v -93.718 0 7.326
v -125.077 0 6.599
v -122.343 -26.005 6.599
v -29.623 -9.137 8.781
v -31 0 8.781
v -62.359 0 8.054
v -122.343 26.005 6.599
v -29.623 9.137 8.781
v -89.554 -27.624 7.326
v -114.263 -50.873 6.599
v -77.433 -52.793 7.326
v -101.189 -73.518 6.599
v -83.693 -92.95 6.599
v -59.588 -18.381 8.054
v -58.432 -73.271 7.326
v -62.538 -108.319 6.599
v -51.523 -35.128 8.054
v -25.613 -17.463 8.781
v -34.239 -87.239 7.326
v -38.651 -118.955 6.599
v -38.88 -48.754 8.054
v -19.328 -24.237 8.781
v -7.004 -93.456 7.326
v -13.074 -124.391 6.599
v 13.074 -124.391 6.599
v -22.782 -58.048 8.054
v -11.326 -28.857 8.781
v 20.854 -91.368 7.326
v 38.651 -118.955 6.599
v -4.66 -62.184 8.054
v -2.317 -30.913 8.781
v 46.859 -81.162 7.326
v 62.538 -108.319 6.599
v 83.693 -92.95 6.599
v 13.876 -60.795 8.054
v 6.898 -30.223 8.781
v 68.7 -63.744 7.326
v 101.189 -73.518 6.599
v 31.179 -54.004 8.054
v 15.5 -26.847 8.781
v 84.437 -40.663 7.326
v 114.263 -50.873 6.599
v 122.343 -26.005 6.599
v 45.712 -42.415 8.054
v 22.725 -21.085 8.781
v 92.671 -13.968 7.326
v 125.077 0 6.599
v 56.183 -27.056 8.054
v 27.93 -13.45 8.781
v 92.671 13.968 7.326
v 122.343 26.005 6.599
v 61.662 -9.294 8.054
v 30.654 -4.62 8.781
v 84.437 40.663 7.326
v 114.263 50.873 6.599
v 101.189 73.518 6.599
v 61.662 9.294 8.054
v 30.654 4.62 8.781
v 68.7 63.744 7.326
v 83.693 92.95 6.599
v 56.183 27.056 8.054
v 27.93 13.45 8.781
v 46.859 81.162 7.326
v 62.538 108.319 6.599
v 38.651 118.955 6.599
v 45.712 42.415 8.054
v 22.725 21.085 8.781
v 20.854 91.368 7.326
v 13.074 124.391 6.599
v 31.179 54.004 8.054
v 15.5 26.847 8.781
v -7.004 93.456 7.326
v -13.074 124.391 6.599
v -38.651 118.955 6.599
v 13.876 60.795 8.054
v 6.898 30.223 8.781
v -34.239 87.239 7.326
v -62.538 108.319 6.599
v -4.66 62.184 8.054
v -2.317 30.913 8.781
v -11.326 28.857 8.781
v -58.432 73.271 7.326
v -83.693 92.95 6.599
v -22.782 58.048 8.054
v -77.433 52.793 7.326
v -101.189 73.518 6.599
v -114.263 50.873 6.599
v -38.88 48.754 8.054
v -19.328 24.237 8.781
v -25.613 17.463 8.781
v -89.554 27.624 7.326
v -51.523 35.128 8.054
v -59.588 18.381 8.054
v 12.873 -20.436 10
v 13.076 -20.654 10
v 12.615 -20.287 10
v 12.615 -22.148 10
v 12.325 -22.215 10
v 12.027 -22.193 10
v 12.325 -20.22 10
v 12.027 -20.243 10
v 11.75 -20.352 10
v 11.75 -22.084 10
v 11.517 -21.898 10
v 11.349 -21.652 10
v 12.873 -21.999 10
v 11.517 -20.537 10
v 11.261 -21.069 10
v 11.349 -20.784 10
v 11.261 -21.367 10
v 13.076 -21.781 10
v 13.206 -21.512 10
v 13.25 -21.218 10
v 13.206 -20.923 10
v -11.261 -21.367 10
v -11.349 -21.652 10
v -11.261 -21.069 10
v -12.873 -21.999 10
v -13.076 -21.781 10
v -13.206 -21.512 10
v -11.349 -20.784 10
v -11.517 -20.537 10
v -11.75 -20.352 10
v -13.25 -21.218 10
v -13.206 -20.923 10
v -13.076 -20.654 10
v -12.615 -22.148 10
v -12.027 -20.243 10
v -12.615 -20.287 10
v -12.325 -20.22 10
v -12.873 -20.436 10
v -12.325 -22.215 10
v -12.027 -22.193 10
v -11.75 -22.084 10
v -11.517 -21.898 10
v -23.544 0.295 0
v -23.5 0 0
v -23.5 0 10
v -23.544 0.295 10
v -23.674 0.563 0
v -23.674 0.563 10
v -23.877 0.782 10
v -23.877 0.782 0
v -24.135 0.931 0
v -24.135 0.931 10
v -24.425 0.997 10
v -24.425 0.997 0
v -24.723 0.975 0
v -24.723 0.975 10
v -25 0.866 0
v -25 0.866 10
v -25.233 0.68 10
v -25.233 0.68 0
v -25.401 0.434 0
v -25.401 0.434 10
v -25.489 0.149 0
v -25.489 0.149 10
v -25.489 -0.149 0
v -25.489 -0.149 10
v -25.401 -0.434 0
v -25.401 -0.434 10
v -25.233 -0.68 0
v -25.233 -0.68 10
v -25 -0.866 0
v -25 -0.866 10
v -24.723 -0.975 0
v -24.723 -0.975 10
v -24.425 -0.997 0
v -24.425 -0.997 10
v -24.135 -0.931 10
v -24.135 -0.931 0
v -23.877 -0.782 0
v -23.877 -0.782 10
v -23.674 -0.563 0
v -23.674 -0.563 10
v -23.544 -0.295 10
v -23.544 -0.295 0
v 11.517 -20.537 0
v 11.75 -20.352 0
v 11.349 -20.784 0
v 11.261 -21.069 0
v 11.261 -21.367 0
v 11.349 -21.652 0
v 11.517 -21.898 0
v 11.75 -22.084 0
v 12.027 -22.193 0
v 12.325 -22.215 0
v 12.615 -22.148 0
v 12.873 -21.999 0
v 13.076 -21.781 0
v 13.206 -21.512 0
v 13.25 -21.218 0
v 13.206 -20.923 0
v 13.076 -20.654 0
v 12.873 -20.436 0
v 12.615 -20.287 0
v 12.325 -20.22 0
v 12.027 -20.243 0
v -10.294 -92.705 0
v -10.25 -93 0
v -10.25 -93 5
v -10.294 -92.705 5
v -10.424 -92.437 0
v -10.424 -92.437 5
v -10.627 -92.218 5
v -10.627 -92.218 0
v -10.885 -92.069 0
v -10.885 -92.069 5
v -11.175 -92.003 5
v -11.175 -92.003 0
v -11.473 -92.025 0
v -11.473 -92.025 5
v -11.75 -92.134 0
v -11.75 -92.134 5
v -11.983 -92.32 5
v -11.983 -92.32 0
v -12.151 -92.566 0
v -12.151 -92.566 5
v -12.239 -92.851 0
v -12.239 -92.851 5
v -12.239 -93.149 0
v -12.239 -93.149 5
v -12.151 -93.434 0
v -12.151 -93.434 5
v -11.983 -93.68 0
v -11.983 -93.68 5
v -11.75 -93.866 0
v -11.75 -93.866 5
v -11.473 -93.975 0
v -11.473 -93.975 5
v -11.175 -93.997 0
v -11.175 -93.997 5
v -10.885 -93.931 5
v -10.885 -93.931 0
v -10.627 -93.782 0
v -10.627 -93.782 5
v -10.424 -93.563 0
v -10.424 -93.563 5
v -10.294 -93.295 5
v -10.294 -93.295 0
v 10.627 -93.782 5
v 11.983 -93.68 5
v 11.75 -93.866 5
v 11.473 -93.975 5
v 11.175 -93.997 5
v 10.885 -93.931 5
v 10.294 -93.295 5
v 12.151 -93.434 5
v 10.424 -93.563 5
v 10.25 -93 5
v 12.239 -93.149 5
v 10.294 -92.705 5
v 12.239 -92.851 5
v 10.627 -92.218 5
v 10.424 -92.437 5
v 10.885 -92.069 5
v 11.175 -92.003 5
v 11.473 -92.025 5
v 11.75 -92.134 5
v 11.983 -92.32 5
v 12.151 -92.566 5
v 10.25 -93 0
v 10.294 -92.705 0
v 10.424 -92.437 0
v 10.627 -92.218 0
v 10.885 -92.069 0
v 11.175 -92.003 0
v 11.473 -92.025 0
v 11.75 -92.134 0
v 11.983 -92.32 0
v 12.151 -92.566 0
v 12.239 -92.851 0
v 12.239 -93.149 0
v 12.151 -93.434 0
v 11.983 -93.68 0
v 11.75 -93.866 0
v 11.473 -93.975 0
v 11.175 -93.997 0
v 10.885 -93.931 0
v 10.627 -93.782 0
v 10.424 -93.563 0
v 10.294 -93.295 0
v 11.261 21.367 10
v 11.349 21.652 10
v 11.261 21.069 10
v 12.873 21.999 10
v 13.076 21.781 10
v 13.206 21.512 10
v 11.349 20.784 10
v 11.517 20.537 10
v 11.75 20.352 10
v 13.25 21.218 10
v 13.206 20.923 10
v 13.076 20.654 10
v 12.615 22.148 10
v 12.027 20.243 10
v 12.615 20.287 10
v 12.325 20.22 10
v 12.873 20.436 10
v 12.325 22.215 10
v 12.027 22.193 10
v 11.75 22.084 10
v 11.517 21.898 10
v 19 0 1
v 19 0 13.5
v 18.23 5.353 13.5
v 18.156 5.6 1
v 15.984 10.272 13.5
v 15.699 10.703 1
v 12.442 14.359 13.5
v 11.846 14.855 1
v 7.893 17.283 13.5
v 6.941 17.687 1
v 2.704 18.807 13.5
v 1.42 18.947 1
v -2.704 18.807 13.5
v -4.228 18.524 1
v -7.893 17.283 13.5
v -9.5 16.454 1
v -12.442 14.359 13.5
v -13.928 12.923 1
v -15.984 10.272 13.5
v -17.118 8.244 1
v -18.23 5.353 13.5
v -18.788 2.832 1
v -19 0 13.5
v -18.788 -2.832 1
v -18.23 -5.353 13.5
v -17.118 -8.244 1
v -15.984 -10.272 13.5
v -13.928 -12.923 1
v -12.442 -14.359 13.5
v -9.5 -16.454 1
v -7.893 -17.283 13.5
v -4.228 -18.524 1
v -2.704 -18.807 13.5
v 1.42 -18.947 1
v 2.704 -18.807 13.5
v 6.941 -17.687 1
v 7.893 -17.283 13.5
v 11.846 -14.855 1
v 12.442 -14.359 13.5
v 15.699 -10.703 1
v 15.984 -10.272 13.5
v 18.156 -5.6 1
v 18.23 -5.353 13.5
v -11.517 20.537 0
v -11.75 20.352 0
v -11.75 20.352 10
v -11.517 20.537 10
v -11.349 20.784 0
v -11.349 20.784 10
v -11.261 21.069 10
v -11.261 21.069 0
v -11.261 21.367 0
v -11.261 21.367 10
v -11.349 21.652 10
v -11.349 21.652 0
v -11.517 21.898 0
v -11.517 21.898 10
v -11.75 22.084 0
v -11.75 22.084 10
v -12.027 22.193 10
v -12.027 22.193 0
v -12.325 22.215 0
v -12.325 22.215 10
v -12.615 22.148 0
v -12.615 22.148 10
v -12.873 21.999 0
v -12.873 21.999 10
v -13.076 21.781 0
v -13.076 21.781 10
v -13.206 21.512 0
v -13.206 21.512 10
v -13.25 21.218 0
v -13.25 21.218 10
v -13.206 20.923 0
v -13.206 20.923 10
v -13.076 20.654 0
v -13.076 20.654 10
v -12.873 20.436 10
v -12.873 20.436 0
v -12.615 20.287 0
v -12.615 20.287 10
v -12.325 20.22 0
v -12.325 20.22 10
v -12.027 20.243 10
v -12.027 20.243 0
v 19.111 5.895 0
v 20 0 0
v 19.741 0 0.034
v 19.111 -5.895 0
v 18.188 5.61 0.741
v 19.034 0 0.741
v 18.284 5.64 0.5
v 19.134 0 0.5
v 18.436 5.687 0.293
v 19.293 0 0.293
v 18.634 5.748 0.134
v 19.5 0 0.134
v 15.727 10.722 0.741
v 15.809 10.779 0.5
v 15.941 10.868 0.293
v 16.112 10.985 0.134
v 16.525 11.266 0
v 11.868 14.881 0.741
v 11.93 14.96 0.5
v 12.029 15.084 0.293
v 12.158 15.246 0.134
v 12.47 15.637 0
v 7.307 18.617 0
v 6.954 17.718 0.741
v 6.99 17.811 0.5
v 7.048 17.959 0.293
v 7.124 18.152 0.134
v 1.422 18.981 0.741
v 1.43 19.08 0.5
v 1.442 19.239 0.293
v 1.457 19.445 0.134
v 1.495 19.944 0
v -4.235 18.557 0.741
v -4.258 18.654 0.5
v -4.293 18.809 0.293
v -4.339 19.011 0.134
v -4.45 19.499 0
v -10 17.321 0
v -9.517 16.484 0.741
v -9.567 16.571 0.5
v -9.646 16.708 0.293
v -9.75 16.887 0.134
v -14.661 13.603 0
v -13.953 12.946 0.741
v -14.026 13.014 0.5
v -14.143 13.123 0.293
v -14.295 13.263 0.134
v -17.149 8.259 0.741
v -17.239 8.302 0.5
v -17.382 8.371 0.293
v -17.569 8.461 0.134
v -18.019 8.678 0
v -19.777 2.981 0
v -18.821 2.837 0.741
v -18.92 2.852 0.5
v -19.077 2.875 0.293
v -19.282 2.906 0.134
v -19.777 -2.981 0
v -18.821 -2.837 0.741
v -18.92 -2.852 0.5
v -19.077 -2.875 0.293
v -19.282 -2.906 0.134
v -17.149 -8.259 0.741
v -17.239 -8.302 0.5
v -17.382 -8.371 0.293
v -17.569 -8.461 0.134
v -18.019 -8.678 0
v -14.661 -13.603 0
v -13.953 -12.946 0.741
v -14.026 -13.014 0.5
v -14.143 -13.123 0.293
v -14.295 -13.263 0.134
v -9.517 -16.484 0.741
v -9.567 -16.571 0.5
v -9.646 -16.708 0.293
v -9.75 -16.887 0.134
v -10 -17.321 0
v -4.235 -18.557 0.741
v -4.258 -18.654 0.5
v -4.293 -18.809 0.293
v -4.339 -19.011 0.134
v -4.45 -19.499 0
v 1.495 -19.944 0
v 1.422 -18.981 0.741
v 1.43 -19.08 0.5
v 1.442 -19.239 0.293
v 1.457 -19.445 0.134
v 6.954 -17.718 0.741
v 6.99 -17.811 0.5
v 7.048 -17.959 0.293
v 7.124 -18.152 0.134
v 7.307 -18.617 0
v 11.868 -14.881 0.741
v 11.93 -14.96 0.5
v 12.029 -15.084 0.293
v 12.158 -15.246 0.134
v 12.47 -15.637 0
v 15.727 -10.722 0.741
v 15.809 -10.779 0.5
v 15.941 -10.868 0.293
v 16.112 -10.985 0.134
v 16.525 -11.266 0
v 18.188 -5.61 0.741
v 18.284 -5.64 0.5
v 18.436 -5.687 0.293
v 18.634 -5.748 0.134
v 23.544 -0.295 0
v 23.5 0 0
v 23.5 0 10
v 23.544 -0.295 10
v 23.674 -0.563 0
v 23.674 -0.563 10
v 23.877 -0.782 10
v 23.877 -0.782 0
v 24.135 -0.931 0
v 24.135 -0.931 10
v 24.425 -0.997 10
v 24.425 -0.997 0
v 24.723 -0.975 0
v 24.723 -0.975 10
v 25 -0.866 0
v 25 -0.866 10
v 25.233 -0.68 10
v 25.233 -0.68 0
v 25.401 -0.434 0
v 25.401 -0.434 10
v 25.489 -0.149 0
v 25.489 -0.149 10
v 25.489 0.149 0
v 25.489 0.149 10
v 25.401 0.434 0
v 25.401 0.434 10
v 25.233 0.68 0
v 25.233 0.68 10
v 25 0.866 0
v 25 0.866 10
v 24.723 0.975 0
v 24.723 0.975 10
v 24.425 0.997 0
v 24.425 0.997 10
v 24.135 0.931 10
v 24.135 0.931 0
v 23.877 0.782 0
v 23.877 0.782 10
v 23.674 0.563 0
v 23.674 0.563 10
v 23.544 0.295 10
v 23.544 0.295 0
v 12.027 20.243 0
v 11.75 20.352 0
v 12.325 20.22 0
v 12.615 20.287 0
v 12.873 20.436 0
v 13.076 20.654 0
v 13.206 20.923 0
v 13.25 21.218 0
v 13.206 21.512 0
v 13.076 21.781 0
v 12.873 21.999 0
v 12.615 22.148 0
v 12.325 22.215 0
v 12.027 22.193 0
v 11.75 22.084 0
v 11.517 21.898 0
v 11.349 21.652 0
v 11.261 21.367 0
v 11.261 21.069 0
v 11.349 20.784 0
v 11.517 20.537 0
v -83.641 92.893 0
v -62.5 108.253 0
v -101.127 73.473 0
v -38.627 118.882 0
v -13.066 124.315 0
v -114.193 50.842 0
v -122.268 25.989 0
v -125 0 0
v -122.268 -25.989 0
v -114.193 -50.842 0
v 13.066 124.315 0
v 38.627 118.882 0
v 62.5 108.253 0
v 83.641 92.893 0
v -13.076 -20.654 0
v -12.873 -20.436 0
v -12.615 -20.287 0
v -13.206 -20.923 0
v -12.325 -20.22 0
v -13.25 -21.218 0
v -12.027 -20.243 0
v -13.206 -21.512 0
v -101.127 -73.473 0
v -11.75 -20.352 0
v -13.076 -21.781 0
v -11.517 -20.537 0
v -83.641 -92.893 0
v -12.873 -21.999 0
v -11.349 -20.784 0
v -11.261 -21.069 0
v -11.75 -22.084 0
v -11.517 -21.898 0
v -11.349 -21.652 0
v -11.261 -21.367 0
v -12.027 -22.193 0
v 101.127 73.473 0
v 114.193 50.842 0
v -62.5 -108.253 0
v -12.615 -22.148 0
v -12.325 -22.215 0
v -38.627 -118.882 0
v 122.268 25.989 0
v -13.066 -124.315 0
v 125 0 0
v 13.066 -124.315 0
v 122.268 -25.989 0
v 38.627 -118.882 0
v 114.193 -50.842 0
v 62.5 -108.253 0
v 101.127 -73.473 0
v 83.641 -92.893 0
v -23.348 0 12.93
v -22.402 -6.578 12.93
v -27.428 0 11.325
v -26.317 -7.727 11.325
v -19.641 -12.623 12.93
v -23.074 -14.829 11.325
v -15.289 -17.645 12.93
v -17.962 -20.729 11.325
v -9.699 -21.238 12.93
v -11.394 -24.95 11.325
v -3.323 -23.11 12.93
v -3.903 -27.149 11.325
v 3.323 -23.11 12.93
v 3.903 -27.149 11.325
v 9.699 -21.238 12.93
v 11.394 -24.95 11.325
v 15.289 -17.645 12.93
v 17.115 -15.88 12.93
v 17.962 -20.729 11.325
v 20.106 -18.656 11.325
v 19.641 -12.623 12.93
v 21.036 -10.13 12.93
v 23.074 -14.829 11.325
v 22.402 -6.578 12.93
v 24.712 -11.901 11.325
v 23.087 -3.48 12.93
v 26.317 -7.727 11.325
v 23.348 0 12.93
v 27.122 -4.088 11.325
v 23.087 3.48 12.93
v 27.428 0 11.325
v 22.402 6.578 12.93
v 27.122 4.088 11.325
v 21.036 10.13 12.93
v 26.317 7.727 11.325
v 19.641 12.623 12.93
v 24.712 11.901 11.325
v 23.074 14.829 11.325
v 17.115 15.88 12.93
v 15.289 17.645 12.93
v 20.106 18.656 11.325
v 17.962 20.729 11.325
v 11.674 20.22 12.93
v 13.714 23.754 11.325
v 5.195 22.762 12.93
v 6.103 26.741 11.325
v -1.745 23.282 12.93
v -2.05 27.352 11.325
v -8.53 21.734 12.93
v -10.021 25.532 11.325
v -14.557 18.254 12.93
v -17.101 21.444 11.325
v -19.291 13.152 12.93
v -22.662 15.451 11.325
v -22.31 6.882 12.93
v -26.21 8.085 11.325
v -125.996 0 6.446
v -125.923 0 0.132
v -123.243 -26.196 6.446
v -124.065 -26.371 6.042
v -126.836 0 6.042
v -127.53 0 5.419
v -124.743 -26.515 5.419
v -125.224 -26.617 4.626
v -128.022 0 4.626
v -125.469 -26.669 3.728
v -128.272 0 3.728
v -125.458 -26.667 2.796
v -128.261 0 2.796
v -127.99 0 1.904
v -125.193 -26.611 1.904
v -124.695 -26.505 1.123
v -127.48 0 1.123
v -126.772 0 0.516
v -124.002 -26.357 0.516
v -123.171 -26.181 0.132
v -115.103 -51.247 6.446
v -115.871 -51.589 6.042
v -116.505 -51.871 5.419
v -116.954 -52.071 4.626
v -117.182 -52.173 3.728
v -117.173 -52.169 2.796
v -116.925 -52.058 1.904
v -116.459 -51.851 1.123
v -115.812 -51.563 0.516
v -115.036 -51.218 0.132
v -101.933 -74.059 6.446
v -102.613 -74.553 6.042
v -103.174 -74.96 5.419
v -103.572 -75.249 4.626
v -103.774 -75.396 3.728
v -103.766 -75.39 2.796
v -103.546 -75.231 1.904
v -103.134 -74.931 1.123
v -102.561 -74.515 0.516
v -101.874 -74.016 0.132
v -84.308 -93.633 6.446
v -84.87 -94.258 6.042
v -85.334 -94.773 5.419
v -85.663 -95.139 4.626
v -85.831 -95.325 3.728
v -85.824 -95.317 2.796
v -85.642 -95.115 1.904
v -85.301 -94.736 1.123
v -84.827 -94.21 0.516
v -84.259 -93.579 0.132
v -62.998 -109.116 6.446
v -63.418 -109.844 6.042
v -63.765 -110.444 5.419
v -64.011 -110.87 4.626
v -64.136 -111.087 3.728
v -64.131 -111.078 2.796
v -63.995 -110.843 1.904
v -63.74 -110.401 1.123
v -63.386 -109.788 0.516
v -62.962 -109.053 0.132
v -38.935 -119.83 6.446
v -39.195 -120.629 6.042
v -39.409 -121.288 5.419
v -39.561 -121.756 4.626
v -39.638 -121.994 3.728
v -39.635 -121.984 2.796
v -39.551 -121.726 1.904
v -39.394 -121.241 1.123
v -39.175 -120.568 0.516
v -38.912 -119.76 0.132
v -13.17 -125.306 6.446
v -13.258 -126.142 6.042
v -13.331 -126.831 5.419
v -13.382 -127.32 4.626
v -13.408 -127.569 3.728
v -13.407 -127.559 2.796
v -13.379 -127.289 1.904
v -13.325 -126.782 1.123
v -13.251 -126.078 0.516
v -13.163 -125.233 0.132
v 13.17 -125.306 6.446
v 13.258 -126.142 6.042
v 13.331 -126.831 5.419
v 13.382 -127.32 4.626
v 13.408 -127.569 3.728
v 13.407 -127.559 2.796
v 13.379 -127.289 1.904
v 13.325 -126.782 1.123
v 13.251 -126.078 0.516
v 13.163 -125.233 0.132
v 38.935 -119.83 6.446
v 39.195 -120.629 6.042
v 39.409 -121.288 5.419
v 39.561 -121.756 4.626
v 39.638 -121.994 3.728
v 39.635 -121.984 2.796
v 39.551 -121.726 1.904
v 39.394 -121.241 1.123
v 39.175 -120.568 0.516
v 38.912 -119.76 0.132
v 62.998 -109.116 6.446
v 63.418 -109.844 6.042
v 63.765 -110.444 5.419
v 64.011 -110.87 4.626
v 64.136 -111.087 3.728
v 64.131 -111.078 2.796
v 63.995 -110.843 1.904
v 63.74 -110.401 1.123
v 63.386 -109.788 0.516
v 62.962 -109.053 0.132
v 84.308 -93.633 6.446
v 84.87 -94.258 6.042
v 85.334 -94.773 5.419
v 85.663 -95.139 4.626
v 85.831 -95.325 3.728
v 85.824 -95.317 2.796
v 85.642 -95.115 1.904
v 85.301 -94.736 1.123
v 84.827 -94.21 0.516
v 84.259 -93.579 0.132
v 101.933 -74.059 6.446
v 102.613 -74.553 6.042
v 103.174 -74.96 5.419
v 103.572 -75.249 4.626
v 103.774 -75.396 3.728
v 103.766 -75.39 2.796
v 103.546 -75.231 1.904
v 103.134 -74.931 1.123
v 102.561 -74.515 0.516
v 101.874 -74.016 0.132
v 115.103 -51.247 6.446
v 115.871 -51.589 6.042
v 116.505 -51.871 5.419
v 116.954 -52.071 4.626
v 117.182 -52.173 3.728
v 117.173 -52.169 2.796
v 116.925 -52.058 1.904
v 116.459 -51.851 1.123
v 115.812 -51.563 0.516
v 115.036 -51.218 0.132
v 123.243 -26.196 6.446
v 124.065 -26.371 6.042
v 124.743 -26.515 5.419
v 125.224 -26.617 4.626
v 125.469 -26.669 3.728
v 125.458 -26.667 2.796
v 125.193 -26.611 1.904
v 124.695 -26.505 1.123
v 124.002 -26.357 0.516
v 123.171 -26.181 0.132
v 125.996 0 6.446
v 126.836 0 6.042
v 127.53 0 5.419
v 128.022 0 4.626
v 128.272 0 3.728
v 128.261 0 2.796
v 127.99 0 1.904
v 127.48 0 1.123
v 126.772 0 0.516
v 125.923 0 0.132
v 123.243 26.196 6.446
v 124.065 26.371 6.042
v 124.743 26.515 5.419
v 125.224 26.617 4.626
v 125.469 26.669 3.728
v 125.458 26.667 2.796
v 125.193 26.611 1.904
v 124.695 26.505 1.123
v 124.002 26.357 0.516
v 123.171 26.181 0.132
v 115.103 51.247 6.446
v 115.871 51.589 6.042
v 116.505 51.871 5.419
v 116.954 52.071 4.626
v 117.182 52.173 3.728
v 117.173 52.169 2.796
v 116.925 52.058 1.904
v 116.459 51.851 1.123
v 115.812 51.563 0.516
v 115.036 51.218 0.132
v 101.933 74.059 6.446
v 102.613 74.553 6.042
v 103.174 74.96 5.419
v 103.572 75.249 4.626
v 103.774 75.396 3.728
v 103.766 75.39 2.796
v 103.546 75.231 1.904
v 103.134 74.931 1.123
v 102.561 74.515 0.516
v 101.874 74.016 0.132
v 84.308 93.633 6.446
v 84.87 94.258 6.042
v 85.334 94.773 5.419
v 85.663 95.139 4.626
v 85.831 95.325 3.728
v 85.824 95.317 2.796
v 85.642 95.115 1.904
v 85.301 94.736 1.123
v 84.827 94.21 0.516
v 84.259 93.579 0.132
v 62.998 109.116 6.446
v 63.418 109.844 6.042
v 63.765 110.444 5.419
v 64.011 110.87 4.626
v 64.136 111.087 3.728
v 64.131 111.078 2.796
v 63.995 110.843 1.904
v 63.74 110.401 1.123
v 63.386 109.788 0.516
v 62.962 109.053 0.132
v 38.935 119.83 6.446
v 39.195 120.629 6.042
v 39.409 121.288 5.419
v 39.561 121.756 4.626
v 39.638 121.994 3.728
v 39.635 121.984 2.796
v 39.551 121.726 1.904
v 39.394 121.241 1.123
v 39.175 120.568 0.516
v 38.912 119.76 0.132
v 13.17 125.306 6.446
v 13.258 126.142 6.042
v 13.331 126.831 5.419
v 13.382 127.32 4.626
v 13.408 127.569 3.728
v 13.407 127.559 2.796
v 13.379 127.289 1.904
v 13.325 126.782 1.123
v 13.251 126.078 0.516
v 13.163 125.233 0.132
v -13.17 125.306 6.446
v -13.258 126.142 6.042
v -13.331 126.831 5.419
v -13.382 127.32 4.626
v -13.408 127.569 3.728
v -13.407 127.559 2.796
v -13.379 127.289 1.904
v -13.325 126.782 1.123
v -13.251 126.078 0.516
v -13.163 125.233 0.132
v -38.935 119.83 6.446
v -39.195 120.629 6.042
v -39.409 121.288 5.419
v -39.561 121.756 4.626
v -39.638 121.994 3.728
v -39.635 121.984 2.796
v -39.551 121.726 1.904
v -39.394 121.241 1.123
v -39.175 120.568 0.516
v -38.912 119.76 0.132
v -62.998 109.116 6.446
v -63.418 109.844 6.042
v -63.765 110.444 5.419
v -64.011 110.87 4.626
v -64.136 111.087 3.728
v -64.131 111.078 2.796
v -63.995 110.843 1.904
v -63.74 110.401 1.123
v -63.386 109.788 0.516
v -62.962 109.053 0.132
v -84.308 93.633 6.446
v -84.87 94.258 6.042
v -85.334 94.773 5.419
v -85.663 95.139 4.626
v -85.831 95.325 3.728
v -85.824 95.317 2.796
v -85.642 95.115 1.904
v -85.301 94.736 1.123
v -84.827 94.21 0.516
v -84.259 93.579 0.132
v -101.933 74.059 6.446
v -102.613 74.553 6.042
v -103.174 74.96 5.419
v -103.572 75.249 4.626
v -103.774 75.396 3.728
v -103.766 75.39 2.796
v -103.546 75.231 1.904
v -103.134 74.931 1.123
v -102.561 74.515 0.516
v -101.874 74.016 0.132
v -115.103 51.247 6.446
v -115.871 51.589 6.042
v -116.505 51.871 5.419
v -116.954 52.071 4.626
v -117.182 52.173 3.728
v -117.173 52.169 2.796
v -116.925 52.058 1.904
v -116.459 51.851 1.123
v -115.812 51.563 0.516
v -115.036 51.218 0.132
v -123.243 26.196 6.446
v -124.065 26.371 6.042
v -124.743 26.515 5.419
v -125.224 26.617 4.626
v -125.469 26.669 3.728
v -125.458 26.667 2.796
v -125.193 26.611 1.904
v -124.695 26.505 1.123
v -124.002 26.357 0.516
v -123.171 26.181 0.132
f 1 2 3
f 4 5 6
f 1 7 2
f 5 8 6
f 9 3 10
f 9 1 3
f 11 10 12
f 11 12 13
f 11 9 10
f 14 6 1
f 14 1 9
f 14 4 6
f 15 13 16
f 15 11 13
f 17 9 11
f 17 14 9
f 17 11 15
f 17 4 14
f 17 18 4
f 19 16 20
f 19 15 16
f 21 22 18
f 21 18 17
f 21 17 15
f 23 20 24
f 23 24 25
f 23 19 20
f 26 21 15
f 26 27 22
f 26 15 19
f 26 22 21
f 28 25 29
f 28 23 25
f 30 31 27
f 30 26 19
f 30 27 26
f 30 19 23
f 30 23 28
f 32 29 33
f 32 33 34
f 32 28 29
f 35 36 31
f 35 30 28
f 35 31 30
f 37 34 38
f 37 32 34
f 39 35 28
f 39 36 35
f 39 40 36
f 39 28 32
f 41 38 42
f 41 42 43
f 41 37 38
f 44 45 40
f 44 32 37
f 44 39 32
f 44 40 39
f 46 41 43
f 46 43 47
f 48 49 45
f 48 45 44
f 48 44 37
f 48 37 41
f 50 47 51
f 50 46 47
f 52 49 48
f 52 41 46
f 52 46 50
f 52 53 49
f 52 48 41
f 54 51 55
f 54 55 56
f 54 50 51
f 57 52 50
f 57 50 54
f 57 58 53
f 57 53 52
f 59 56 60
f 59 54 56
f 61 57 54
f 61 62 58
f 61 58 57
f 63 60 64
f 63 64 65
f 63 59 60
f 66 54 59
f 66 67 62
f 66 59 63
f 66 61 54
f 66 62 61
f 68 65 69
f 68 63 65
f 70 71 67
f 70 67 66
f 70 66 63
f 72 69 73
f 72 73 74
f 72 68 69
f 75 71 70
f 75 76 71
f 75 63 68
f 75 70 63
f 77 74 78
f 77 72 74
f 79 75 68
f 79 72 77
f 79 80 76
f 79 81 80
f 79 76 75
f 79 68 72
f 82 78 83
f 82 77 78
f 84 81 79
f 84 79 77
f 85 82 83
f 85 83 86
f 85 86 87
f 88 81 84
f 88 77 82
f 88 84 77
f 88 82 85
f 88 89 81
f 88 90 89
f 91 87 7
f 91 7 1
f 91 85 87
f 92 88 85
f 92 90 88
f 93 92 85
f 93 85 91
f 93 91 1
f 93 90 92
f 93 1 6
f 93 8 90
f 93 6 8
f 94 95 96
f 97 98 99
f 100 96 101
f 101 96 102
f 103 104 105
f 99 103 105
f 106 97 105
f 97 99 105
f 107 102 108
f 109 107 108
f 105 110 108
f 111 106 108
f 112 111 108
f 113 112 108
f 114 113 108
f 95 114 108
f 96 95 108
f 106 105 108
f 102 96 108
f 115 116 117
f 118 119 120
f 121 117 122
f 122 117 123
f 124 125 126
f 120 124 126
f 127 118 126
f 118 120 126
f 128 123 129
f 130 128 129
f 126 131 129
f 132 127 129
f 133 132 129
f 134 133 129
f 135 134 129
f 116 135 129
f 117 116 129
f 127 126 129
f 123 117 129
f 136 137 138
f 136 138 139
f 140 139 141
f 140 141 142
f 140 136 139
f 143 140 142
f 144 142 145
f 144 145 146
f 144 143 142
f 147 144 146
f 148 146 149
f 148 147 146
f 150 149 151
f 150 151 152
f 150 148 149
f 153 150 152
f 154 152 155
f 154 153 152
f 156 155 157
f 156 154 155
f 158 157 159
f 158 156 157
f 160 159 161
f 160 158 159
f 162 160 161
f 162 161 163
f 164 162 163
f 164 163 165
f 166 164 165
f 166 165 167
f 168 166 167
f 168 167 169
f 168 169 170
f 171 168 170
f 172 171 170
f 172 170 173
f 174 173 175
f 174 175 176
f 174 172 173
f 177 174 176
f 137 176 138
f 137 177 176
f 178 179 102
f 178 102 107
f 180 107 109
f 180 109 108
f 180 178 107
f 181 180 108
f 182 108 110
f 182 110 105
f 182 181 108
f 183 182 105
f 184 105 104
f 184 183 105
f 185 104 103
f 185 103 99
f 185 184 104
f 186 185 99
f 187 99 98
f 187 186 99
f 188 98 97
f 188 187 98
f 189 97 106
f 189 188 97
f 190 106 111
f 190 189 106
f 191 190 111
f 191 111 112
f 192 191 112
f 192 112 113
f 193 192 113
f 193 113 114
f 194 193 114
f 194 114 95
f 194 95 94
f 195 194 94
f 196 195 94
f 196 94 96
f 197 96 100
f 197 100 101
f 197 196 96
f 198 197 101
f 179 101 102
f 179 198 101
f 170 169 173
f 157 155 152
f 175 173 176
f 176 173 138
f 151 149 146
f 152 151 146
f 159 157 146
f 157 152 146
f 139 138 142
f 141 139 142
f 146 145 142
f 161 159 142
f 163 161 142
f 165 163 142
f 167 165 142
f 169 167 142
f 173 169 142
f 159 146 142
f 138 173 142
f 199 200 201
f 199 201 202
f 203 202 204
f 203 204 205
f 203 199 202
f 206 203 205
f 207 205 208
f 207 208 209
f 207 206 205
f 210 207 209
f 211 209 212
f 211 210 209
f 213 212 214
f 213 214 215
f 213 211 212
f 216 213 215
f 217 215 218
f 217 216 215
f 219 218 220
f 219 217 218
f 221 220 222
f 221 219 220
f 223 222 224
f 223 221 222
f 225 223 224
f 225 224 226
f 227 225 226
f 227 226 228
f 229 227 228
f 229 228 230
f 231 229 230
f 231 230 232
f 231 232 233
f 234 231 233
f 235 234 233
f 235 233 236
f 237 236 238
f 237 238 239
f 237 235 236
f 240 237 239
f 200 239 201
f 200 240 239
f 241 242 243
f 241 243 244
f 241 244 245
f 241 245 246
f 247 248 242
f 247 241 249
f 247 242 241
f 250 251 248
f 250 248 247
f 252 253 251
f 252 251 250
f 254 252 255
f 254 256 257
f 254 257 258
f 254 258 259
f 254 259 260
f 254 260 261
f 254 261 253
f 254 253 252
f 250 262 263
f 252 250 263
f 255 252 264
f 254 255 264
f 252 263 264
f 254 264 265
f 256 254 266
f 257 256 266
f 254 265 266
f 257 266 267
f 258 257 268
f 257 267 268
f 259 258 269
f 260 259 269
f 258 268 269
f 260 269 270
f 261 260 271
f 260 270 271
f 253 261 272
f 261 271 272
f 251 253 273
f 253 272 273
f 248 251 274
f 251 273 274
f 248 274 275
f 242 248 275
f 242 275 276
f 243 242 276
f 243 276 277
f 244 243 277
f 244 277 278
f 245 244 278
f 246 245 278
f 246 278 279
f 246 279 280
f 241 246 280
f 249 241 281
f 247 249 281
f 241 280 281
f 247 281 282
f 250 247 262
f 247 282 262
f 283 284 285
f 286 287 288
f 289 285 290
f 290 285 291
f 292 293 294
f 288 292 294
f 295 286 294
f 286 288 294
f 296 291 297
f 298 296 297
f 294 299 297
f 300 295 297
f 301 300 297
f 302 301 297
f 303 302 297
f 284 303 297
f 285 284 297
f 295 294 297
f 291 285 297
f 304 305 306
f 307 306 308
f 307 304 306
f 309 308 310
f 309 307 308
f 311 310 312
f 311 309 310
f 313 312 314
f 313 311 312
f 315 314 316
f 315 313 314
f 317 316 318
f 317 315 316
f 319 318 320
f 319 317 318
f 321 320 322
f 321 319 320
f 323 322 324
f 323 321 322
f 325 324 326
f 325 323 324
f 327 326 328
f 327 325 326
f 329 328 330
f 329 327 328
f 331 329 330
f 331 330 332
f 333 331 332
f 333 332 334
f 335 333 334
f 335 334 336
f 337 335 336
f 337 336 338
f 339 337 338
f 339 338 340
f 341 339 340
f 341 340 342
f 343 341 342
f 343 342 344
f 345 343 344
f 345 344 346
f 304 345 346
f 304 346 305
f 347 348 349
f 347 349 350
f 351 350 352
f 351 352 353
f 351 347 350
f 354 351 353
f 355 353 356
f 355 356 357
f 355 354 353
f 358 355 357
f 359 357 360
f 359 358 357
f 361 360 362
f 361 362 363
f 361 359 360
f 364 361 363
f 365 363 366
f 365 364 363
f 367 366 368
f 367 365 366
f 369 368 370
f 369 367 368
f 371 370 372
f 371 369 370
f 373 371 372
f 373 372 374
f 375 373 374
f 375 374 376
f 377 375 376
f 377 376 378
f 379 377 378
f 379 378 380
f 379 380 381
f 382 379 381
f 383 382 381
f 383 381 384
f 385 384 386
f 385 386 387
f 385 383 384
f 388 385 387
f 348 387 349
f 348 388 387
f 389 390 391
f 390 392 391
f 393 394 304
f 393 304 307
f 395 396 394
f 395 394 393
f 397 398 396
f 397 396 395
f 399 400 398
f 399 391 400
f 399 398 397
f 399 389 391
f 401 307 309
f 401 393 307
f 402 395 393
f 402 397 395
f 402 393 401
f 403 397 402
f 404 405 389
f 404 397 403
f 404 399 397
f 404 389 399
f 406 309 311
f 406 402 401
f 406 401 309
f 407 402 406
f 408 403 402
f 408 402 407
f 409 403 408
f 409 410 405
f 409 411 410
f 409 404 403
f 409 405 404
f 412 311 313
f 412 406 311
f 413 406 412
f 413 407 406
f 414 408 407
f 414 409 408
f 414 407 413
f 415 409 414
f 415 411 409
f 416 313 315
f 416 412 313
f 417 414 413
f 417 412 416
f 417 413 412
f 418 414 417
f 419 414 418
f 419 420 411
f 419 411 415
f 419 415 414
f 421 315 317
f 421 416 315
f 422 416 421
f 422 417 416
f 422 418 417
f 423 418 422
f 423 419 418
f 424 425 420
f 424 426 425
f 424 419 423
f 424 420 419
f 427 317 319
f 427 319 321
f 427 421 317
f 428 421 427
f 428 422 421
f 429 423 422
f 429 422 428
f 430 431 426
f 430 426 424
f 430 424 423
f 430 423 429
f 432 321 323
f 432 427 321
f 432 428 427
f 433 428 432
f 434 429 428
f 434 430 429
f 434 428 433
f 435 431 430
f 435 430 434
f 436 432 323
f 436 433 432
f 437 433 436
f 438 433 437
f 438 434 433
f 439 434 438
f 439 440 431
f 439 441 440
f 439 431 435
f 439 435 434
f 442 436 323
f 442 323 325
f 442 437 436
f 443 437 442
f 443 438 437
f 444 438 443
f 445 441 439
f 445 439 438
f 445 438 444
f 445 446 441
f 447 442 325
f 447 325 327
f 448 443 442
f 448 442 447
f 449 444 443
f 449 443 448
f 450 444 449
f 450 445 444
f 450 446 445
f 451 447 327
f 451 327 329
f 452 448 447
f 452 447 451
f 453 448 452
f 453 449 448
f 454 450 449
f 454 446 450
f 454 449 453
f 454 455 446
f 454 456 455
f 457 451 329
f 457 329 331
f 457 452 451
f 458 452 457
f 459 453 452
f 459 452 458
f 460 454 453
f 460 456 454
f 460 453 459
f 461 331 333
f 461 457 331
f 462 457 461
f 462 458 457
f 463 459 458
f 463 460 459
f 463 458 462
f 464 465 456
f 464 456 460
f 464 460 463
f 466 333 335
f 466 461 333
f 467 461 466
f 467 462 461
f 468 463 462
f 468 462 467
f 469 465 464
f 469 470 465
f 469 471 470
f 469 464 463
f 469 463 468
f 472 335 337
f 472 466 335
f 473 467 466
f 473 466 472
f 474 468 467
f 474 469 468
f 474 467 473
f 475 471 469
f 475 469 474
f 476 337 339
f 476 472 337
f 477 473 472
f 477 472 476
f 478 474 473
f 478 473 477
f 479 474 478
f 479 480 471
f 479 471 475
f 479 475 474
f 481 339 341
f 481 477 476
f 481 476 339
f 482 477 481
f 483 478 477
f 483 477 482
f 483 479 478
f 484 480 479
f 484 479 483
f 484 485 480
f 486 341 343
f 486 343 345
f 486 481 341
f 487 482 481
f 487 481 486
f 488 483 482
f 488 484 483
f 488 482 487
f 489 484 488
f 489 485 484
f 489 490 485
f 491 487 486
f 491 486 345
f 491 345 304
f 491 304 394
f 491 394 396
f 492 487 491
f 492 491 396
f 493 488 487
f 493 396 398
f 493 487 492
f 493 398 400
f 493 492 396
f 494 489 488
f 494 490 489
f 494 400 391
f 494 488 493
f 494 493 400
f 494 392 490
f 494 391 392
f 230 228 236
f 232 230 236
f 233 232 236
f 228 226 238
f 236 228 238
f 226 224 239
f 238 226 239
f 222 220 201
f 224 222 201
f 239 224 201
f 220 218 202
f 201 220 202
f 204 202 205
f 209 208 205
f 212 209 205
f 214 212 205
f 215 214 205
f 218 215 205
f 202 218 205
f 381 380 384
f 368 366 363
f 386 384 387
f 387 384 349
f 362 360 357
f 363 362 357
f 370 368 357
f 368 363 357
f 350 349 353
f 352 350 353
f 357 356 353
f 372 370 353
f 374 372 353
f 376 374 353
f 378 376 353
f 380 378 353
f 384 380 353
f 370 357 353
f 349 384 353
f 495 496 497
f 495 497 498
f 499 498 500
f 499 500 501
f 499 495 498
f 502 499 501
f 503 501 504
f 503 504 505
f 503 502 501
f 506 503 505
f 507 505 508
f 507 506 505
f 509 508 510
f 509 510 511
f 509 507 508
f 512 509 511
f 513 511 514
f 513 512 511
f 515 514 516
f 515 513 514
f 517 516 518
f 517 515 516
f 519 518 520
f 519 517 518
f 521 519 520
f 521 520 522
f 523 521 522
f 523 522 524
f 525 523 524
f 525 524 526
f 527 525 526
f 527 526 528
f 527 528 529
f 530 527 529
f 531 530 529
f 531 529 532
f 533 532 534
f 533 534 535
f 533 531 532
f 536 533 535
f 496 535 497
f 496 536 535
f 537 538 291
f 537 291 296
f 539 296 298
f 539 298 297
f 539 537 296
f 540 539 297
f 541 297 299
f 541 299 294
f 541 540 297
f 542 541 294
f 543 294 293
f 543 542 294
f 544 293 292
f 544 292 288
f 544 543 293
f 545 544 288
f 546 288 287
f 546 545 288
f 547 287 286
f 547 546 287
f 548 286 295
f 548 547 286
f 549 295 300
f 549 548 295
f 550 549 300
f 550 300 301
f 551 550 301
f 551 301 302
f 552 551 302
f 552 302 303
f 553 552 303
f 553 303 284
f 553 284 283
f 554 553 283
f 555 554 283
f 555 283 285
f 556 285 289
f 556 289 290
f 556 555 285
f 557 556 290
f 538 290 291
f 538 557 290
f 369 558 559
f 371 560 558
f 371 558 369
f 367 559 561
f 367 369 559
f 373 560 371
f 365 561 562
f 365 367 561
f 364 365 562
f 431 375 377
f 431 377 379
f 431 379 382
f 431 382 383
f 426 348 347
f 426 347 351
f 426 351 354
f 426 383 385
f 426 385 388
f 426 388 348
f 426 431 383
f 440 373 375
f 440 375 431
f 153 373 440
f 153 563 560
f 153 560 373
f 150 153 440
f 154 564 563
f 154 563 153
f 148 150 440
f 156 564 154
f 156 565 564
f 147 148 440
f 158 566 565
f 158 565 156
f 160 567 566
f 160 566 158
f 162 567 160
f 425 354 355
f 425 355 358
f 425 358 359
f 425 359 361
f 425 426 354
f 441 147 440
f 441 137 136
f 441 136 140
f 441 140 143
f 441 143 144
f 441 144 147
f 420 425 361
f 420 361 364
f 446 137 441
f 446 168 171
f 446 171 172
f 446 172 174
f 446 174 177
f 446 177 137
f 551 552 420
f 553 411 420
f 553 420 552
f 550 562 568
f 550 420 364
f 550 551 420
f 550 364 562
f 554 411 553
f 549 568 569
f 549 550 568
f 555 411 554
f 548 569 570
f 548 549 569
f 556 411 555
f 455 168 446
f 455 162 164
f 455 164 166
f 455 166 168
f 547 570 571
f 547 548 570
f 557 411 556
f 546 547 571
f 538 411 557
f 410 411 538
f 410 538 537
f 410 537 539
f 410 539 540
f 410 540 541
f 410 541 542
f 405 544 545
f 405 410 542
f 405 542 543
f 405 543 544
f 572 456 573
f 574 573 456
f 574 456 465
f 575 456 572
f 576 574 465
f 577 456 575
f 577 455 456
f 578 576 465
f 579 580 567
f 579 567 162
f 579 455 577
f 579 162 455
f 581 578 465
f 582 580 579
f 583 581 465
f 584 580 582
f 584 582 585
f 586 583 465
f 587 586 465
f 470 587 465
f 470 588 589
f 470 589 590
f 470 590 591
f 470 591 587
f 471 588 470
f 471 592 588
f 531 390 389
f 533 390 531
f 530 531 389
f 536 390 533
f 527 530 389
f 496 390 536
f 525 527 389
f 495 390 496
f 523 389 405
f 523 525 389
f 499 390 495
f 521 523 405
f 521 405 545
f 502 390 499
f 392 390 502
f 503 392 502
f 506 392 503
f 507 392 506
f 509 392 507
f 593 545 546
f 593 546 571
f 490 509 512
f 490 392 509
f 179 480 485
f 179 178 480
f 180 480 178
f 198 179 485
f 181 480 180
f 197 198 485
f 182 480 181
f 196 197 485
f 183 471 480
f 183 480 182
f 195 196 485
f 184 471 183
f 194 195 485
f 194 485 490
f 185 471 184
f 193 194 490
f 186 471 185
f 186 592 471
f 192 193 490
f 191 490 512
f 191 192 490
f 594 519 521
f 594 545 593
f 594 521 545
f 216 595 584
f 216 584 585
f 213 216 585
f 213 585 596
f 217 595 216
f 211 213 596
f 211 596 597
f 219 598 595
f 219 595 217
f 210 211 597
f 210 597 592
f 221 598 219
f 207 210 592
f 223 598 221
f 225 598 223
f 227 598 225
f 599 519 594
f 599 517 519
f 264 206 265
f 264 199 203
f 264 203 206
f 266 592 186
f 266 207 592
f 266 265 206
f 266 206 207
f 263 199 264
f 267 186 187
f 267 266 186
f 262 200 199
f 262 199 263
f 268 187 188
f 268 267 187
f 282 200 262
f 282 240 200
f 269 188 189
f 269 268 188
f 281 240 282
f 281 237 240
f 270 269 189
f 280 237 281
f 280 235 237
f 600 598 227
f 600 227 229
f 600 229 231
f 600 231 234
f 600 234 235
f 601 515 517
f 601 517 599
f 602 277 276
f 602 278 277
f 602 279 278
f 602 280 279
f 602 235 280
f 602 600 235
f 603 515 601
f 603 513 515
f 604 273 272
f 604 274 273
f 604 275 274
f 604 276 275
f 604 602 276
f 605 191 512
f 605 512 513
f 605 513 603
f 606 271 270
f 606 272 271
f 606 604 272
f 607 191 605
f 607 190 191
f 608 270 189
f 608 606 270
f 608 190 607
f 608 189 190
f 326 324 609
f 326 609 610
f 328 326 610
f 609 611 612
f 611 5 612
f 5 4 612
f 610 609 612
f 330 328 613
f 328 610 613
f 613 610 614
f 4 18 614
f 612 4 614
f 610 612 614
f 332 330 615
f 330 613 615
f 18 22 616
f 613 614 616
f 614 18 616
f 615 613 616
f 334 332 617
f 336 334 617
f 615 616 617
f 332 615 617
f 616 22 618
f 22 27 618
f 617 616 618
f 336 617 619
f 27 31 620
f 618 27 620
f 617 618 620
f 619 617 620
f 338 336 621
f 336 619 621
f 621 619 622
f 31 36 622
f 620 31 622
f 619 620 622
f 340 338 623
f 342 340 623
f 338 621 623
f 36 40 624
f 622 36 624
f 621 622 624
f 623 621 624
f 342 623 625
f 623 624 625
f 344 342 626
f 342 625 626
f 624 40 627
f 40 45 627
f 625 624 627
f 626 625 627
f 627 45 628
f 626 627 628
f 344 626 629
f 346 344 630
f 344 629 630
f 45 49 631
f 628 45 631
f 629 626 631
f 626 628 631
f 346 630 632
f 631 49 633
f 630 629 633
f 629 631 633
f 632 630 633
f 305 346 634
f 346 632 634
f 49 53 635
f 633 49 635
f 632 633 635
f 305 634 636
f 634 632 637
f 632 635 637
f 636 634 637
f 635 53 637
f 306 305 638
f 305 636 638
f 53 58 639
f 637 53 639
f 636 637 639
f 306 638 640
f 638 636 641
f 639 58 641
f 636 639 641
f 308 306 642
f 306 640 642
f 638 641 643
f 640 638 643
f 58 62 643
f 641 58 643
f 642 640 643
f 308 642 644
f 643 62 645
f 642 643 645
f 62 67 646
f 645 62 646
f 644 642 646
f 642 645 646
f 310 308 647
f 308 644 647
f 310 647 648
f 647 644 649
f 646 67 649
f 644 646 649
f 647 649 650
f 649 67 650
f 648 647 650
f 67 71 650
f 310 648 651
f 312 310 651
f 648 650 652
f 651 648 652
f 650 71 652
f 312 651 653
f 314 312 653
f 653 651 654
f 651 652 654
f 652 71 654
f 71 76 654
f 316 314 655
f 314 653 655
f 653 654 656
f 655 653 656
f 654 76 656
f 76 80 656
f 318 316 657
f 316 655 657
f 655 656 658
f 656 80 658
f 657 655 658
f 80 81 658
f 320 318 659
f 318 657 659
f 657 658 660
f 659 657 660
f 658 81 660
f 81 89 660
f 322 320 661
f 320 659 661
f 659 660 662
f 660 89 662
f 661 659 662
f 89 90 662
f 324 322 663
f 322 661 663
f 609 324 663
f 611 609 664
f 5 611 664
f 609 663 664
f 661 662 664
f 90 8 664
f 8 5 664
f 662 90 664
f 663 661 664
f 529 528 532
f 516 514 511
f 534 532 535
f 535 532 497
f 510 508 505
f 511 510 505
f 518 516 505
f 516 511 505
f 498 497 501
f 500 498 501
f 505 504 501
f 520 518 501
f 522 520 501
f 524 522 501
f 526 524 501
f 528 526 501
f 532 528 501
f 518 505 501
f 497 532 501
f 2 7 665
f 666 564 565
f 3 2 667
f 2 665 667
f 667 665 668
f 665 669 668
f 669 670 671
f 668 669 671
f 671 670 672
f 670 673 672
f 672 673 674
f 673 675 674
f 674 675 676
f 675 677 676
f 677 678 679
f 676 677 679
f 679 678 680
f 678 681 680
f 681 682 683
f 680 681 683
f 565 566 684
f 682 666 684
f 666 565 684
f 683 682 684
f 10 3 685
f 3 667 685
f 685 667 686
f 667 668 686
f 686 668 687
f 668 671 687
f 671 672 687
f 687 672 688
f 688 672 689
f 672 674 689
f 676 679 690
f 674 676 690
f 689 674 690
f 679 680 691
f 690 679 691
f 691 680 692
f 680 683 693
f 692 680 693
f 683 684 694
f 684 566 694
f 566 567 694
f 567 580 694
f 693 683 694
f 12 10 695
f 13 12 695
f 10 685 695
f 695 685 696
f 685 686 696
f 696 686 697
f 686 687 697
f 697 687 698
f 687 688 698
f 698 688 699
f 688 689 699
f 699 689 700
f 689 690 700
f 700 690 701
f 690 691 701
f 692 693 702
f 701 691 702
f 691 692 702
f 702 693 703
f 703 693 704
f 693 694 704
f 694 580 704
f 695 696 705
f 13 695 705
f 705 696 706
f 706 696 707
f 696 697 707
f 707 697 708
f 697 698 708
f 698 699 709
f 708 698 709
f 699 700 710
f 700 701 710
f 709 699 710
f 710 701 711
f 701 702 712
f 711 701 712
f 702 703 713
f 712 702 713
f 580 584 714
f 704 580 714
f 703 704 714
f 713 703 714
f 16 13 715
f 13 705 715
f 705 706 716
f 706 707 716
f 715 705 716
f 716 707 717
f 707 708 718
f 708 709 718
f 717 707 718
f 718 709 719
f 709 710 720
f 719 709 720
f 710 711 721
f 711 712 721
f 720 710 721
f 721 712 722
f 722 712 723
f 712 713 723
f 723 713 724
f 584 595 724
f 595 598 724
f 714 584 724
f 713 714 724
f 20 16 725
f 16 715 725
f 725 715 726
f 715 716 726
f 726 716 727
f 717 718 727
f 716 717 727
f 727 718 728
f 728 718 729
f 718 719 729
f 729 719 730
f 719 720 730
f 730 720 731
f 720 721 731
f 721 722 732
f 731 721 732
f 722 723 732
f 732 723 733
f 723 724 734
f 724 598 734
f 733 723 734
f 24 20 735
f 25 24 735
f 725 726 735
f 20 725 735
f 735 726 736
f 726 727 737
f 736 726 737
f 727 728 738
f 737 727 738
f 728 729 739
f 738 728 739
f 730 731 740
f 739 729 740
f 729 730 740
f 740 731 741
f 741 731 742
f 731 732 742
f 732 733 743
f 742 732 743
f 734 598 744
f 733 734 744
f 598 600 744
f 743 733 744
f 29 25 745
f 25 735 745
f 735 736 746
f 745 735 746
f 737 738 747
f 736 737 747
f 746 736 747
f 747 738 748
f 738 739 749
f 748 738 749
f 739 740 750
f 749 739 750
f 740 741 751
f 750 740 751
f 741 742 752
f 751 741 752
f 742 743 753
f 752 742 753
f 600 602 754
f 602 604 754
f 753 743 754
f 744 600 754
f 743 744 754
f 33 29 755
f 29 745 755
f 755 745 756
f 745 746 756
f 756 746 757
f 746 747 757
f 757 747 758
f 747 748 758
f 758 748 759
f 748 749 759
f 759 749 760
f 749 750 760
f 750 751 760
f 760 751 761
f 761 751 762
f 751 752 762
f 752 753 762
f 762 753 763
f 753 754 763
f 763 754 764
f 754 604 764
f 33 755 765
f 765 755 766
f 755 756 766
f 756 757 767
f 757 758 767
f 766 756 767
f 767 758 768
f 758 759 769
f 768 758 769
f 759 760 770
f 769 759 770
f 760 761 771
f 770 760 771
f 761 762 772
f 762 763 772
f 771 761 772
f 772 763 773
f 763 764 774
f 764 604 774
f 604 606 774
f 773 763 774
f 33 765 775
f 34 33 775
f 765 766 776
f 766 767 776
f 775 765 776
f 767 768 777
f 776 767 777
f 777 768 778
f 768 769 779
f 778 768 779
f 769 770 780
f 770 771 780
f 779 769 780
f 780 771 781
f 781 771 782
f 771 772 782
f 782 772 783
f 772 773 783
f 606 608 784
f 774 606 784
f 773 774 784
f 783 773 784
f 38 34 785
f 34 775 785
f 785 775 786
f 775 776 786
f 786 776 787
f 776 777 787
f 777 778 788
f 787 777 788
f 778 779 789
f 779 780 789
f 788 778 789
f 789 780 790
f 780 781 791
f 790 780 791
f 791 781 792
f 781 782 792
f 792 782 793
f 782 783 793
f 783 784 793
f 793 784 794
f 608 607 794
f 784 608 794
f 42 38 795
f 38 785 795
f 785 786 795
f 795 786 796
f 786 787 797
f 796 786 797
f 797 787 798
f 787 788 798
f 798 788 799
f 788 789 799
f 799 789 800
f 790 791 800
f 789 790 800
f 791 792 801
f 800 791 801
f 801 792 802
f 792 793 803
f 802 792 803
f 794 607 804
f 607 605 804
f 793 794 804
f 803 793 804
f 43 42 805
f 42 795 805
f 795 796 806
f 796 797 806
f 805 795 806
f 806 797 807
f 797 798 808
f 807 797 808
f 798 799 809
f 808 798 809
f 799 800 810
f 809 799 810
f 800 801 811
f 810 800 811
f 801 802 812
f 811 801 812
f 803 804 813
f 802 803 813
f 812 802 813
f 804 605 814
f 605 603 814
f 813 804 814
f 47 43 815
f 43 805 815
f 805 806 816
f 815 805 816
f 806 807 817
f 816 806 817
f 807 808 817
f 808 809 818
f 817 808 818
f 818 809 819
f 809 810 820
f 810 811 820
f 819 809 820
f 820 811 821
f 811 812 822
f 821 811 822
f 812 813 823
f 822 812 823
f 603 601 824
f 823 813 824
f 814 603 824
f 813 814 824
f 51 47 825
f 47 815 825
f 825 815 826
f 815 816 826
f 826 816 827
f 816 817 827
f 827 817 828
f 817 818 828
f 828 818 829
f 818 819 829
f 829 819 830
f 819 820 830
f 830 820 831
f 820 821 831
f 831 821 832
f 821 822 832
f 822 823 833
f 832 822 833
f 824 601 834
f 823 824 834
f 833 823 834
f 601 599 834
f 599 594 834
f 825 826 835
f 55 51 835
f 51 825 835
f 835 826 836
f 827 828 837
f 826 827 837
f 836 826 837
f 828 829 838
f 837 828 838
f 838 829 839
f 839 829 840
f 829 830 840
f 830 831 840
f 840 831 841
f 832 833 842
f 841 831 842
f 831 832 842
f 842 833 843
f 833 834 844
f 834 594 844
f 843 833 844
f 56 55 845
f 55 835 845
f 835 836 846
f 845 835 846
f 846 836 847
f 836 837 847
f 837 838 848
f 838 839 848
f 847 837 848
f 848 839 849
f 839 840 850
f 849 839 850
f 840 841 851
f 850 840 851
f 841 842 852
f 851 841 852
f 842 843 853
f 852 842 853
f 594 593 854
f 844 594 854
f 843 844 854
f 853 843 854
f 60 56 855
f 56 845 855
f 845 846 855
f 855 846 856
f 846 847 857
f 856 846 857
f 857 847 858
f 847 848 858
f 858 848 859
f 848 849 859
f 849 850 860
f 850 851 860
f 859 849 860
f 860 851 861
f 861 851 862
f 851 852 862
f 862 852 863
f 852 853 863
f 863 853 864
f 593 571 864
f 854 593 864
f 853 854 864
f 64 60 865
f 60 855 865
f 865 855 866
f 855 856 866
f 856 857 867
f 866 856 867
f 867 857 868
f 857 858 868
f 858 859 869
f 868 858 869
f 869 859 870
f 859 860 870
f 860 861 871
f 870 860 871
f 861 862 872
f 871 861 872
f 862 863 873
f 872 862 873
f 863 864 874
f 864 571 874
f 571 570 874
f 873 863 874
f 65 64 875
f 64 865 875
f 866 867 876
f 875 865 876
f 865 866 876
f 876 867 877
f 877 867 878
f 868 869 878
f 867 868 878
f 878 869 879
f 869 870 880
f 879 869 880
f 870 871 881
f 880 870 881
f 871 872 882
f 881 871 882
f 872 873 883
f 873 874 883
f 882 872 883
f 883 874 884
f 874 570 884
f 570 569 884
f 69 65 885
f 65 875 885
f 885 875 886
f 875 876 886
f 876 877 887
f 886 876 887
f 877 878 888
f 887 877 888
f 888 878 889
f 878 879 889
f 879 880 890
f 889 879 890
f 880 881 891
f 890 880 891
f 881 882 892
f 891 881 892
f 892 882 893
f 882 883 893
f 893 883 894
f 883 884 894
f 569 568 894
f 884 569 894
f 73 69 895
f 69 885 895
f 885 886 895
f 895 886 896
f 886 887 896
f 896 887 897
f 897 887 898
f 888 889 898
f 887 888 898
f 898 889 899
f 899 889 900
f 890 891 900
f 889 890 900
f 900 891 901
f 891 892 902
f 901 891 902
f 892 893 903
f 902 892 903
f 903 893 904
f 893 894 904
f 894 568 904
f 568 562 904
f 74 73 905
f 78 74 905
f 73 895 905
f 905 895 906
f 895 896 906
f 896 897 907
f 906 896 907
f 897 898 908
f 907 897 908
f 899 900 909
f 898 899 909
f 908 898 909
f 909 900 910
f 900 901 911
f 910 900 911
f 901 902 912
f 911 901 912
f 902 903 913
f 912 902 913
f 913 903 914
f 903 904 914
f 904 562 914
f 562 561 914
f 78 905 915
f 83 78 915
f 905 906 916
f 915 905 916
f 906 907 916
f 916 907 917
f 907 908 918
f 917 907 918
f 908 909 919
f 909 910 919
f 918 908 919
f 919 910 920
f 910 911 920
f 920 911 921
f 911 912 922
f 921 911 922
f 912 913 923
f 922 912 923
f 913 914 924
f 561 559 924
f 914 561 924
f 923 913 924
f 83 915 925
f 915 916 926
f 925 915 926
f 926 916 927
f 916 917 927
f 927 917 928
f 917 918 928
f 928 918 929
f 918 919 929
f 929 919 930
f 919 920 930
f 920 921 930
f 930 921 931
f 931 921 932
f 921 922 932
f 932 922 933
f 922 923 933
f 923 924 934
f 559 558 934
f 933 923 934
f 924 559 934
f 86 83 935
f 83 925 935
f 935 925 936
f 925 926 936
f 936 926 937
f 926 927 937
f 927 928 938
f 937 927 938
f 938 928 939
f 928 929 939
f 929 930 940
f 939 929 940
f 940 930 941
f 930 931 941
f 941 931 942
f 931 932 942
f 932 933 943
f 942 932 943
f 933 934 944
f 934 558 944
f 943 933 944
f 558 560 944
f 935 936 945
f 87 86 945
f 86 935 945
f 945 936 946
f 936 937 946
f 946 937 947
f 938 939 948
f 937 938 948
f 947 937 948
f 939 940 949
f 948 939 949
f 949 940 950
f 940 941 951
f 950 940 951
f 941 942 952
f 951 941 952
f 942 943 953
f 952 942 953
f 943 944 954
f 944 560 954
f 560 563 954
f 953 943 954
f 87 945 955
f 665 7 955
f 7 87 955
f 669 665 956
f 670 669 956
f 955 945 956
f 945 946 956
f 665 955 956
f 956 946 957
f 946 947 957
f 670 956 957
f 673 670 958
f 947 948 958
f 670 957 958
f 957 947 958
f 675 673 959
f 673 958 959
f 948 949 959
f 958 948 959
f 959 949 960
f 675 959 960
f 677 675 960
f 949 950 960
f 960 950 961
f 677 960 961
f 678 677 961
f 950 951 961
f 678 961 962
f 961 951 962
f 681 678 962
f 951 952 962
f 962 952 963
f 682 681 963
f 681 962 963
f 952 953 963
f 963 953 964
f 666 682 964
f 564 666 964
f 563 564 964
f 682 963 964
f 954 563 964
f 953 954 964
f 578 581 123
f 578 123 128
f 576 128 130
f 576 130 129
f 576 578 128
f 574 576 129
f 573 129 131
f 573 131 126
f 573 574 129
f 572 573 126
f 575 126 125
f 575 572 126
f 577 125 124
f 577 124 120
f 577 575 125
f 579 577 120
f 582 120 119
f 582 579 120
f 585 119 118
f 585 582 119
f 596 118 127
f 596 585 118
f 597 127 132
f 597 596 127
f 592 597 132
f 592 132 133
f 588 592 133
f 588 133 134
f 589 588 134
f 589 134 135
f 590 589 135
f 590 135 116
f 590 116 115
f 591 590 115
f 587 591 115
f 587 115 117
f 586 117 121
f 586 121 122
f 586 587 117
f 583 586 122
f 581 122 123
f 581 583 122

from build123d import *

# Parameters (mm, degrees)
CYLINDER_R         = 19
CYLINDER_DEPTH     = 20
FILLET001_R        = 1
CYLINDER012_R      = 1
CYLINDER012_DEPTH  = 5
CYLINDER013_R      = 1
CYLINDER013_DEPTH  = 10
POLARPATTERN_COUNT = 6


with BuildPart() as part:
    # Sketch → Revolution (revolve)
    with BuildSketch(Plane.XZ):
        with BuildLine():
            Line((0, 0), (-125, 0))
            ThreePointArc((-125.0765159951, 6.5991128054), (-128.2997781939, 3.2617394308), (-125, 0))
            Line((-125.0765159951, 6.5991128054), (0, 9.5))
            Line((0, 0), (0, 9.5))
        make_face()
    revolve(axis=Axis((0, 0, 0), (0, 0, 1)))

    # Sketch001 → Revolution001 (revolve)
    with BuildSketch(Plane.XZ):
        with BuildLine():
            Line((-19, 13.5), (0, 13.5))
            Line((0, 13.5), (0, 9.5))
            Line((0, 9.5), (-31, 8.7810200834))
            ThreePointArc((-19, 13.5), (-25.437061592, 12.2519237786), (-31, 8.7810200834))
        make_face()
    revolve(axis=Axis((0, 0, 0), (0, 0, 1)))

    # Cylinder → Cylinder (cut)
    with BuildSketch(Plane.XY):
        Circle(CYLINDER_R)
    extrude(amount=CYLINDER_DEPTH, mode=Mode.SUBTRACT)

    # Fillet001
    fillet001_edges = [part.edges().sort_by_distance(p)[0] for p in [
        (-19, 0, 0),
    ]]
    fillet(fillet001_edges, radius=FILLET001_R)

    # Cylinder012 → Cylinder012 (cut)
    with BuildSketch(Plane(origin=(-11.25, -93, 0), x_dir=(1, 0, 0), z_dir=(0, 0, 1))):
        Circle(CYLINDER012_R)
    cylinder012 = extrude(amount=CYLINDER012_DEPTH, mode=Mode.SUBTRACT)

    # Mirrored002: Cylinder012 across YZ
    add(cylinder012.mirror(Plane.YZ), mode=Mode.SUBTRACT)

    # Cylinder013 → Cylinder013 (cut)
    with BuildSketch(Plane(origin=(-24.5, 0, 0), x_dir=(1, 0, 0), z_dir=(0, 0, 1))):
        Circle(CYLINDER013_R)
    cylinder013 = extrude(amount=CYLINDER013_DEPTH, mode=Mode.SUBTRACT)

    # PolarPattern: Cylinder013 ×6 about axis
    polarpattern_axis = Axis((0, 0, 0), (0, 0, 1))
    for i in range(1, POLARPATTERN_COUNT):
        add(cylinder013.rotate(polarpattern_axis, i * 360 / POLARPATTERN_COUNT), mode=Mode.SUBTRACT)


solid = part.part
